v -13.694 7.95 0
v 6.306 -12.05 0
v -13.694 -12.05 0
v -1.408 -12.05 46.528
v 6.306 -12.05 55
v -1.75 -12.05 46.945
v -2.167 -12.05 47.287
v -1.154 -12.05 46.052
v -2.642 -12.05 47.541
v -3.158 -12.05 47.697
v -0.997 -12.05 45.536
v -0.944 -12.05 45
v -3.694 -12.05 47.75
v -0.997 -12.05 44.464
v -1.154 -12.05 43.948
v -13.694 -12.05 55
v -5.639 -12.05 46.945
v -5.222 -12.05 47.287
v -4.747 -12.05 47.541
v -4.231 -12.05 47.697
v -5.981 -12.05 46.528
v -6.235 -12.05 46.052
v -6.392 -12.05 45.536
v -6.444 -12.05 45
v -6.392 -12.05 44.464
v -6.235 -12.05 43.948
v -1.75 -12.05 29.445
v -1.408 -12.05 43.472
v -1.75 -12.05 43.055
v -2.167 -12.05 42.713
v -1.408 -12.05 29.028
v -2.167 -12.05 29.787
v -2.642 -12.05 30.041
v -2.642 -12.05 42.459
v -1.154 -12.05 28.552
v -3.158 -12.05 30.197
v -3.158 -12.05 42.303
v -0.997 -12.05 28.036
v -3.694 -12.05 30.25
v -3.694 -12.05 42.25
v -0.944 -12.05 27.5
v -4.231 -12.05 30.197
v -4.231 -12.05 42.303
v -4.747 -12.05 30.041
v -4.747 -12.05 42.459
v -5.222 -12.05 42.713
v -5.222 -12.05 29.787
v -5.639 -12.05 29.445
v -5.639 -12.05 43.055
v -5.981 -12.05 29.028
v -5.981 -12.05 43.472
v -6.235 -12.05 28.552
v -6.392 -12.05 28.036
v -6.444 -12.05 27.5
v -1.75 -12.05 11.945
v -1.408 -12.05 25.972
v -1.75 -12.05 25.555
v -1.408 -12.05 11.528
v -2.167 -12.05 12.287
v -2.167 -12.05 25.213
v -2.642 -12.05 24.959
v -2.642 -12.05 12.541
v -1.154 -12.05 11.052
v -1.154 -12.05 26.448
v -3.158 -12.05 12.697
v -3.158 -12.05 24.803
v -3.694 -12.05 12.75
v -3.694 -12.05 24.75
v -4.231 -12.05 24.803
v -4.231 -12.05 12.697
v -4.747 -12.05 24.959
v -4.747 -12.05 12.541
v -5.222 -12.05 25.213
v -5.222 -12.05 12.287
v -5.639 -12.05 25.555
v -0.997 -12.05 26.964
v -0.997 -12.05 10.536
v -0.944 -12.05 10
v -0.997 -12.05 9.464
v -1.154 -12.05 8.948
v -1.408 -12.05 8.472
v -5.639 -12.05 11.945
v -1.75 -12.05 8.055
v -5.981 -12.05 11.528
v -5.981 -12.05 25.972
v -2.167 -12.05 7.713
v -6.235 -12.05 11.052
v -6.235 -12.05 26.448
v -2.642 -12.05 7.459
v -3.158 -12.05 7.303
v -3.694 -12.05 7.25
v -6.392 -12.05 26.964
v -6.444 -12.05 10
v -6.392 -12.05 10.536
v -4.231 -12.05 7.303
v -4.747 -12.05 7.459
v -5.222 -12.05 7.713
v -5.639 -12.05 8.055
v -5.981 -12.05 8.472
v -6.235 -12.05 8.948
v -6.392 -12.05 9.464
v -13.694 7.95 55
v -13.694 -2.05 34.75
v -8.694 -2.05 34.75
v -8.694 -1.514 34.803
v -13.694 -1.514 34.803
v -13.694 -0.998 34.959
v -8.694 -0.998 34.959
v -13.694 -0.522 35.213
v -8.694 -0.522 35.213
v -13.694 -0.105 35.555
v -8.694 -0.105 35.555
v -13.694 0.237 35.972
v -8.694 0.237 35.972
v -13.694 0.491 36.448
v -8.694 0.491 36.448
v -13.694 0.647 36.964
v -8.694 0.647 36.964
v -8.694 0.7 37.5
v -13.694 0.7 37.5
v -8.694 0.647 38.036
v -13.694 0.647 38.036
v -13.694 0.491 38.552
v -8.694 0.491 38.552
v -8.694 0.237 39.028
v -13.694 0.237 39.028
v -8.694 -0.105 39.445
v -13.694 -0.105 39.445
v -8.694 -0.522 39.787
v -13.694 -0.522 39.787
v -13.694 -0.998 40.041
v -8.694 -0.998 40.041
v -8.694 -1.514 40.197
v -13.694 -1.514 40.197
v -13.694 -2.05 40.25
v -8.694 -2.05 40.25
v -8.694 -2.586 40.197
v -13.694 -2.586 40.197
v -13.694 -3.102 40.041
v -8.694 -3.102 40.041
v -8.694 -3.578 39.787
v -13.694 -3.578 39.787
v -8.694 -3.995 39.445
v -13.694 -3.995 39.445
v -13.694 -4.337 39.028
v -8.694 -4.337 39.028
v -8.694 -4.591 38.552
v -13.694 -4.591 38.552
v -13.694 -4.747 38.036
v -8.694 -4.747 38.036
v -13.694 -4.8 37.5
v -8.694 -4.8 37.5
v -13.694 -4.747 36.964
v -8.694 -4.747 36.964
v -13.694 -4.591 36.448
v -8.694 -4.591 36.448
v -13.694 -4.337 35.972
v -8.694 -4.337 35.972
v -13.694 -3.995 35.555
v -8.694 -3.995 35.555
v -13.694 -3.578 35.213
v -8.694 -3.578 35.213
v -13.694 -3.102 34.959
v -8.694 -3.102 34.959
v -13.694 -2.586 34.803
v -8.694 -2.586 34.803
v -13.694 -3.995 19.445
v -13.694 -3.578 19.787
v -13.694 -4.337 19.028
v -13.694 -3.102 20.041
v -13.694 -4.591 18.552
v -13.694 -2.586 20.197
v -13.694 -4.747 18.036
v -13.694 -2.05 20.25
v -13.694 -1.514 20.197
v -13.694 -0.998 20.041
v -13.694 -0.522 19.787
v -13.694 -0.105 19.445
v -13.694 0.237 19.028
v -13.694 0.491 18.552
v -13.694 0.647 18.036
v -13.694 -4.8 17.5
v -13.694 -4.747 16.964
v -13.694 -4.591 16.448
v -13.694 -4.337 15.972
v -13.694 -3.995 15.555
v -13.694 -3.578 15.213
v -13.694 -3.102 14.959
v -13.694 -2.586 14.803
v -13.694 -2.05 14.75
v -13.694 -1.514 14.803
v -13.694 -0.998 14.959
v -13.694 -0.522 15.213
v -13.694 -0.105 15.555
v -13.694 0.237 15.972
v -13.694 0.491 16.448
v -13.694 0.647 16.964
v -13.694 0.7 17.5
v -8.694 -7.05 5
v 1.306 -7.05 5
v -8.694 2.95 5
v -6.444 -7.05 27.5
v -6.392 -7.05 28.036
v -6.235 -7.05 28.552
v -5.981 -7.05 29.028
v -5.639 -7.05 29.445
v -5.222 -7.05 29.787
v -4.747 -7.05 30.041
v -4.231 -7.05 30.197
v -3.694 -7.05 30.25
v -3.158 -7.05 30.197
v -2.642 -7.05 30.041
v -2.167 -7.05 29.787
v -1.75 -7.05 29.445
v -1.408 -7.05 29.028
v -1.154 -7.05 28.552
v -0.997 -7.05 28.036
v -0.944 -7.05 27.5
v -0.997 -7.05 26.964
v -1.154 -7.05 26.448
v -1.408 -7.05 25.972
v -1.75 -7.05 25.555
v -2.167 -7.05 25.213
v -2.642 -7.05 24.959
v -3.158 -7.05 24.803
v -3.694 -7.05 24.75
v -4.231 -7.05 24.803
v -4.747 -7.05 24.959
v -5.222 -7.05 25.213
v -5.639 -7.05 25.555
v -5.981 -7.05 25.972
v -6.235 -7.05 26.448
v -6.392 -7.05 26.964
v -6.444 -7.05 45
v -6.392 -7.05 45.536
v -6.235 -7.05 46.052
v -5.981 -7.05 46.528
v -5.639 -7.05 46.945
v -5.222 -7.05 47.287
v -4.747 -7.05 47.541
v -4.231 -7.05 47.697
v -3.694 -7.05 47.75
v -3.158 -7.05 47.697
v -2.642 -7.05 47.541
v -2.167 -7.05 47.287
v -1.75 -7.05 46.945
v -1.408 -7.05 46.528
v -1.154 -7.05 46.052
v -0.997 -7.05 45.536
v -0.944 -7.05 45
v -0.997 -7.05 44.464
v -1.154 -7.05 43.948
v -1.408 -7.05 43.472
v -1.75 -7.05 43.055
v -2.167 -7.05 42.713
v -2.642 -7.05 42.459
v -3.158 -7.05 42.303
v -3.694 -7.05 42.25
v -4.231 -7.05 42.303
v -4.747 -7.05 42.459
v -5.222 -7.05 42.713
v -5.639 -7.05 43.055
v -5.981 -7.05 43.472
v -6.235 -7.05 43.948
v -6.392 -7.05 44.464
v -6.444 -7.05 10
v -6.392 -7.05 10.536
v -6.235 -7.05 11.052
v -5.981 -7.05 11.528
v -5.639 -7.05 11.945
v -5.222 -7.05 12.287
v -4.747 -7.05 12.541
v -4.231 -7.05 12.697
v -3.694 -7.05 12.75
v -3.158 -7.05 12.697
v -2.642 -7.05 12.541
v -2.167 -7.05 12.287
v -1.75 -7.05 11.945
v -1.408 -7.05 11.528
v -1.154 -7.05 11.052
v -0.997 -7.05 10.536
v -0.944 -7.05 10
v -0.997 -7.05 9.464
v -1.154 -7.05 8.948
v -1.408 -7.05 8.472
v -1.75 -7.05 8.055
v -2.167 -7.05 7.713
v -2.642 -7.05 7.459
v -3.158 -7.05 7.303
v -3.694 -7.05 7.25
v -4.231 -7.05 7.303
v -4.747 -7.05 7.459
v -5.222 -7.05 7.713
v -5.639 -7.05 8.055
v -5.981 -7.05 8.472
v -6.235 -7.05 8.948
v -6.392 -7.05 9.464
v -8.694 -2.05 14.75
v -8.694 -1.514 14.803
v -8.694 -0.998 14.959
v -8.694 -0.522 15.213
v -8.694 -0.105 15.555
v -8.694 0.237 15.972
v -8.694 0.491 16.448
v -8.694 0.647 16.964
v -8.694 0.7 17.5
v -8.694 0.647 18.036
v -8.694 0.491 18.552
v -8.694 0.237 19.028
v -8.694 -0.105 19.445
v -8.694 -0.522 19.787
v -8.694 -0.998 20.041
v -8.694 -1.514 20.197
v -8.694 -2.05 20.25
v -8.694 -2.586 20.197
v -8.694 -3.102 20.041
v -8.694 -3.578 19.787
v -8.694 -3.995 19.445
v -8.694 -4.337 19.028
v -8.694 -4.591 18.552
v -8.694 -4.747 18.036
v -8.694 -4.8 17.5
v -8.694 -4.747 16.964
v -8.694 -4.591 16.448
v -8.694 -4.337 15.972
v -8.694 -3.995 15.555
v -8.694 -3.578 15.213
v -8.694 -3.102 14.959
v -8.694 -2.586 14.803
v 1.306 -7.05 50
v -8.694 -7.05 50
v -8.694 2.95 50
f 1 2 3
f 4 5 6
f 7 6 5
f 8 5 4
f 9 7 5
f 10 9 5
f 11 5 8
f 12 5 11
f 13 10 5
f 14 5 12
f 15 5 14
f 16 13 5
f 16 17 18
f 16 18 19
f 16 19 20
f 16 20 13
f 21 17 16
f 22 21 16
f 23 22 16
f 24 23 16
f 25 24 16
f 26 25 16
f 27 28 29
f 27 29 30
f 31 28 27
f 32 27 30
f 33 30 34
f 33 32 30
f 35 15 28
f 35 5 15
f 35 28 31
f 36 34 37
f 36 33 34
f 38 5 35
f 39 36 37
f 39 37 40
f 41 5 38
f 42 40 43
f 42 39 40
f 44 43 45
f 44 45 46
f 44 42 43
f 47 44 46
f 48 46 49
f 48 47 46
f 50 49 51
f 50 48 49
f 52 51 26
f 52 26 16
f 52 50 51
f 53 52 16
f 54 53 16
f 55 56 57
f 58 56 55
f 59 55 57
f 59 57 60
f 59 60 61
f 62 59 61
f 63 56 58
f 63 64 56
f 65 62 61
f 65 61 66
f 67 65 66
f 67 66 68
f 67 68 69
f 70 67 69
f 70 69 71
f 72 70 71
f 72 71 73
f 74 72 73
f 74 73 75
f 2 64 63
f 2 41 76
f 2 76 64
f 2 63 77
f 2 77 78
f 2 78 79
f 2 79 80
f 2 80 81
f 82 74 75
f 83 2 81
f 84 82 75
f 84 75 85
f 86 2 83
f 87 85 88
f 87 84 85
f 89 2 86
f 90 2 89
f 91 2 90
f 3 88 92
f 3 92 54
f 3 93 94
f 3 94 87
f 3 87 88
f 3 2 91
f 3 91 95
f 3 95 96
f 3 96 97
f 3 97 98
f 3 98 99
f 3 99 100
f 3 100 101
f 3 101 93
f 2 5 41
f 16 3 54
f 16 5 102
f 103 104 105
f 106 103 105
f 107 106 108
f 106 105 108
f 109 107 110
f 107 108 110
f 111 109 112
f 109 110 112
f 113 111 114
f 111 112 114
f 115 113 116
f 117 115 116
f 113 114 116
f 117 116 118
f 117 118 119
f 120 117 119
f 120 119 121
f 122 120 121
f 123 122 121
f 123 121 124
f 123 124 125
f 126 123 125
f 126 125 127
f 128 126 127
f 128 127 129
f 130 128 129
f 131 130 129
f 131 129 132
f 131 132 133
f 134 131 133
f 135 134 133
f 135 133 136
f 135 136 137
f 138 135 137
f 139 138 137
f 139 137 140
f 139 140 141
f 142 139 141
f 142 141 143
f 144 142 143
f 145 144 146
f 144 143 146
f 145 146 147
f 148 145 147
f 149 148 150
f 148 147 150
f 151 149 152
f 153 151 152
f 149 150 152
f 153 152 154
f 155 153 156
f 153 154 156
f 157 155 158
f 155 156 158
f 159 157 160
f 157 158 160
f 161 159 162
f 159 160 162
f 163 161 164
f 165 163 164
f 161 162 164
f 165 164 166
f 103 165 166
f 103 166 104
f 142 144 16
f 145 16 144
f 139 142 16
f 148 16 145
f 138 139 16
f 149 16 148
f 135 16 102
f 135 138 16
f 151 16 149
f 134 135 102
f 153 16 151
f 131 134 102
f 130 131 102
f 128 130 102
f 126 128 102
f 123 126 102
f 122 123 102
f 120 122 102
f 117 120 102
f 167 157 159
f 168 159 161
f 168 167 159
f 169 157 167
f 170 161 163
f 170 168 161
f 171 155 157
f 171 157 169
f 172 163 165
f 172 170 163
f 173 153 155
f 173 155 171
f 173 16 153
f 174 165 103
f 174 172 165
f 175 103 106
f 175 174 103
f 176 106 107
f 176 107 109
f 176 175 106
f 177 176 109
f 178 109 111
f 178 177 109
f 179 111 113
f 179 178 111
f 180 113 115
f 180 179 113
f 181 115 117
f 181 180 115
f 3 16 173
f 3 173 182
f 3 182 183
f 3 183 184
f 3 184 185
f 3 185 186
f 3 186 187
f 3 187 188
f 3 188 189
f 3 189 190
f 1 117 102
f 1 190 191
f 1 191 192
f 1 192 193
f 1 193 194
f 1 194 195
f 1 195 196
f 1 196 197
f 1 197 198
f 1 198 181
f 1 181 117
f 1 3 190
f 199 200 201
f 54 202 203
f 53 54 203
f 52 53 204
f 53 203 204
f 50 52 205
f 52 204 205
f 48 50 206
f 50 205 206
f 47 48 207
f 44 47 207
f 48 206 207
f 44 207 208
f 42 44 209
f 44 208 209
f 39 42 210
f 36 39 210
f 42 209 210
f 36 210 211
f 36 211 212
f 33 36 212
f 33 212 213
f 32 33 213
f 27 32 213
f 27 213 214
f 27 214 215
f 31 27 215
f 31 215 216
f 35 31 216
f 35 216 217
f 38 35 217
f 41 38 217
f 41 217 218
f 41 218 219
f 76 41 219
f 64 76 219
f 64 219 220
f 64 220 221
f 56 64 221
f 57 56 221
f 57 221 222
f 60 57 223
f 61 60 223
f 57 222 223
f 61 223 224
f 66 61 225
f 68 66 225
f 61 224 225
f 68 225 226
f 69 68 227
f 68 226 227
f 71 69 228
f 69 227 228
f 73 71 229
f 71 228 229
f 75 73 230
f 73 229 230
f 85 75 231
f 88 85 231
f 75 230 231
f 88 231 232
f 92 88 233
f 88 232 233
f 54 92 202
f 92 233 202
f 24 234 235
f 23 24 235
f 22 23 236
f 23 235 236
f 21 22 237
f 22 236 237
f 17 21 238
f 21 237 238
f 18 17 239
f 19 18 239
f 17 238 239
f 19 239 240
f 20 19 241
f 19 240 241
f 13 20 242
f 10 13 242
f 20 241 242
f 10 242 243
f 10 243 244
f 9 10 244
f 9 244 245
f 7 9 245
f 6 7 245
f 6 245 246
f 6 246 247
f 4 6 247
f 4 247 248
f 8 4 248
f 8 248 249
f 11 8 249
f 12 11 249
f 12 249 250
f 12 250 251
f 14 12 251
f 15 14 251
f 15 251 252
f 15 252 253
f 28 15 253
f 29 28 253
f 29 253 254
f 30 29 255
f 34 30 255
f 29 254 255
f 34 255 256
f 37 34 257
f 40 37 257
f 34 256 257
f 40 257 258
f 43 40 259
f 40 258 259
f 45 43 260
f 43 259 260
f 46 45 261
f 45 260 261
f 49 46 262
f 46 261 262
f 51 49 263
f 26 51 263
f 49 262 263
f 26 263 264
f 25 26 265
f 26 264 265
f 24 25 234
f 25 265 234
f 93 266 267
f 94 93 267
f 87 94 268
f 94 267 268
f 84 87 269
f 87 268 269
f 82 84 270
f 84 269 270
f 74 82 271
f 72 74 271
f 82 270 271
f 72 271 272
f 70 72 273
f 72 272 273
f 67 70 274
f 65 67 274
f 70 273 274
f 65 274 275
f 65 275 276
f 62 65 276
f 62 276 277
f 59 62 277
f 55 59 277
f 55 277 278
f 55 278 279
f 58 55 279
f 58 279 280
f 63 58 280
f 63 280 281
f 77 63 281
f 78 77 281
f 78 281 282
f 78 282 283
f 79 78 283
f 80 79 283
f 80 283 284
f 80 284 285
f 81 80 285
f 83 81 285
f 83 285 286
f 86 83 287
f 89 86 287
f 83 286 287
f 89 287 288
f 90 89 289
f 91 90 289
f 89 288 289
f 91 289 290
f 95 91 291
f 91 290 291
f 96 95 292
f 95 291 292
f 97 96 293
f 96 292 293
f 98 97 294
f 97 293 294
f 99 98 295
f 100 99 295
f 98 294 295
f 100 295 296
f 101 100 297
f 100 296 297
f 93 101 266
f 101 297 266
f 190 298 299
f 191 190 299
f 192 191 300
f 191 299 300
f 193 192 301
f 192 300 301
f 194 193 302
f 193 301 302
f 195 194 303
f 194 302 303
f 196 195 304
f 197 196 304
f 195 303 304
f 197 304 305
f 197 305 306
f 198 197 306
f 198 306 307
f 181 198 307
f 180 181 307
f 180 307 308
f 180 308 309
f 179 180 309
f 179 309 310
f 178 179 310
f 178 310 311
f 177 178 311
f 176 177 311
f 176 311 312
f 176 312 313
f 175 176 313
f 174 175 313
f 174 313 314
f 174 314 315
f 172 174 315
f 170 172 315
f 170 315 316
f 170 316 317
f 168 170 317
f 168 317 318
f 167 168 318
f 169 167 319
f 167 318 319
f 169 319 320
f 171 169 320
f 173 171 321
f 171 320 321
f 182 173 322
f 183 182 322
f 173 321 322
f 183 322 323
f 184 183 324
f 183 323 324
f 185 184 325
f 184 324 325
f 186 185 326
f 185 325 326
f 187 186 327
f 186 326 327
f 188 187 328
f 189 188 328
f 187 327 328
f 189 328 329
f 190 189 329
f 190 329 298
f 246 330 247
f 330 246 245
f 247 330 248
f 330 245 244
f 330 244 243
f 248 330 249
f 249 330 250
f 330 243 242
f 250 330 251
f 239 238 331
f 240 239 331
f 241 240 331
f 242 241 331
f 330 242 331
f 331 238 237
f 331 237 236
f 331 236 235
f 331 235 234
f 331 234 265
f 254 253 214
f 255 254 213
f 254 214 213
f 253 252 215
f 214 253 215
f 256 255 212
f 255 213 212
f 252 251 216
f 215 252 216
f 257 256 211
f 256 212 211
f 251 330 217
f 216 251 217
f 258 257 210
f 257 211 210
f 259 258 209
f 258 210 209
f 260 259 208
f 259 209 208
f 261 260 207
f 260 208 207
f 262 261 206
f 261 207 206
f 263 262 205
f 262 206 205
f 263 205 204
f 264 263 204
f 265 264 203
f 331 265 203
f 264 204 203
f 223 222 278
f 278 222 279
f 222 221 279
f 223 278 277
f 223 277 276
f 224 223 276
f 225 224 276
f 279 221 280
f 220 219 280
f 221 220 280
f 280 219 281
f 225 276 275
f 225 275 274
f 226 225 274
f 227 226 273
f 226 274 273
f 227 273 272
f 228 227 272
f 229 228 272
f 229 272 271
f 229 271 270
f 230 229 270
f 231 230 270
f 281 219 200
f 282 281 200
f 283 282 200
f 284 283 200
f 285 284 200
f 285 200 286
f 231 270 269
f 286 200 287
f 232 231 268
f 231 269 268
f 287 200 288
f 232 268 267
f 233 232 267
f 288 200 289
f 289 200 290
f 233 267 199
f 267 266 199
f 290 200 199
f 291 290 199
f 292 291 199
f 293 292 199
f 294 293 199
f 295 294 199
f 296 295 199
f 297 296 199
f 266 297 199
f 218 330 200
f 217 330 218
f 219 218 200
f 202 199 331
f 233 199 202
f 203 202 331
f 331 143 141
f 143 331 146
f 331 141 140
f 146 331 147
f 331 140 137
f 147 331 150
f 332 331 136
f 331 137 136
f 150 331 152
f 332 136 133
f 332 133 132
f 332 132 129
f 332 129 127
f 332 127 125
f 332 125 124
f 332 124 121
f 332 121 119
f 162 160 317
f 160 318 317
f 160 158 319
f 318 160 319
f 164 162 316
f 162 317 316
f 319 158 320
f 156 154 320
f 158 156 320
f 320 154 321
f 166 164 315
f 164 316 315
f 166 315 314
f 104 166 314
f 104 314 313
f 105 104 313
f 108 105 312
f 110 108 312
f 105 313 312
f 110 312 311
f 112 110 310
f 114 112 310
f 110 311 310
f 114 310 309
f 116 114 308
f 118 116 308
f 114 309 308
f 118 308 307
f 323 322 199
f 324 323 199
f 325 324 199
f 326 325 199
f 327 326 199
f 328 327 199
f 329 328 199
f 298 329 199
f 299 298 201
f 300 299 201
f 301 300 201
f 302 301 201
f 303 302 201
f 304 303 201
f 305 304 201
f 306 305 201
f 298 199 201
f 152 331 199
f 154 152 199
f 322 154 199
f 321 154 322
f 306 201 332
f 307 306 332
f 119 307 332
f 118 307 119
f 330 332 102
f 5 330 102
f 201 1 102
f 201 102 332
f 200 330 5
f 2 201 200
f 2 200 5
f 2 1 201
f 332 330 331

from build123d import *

# Parameters (mm, degrees)
BOSS_EXTRU_1_DEPTH      = 5
BOSS_EXTRU_2_DEPTH      = 45
BOSS_EXTRU_3_DEPTH      = 5
ENL_V_MAT_EXTRU_1_REACH = 60.268
ESQUISSE4_R             = 2.75
ENL_V_MAT_EXTRU_2_REACH = 60.631
ESQUISSE5_R             = 2.75


with BuildPart() as part:
    # Esquisse1 → Boss.-Extru.1 (new body)
    with BuildSketch(Plane.XY):
        Polygon((-13.694471154, 7.95), (6.305528846, -12.05), (-13.694471154, -12.05), align=None)
    extrude(amount=BOSS_EXTRU_1_DEPTH)

    # Esquisse2 → Boss.-Extru.2 (add)
    with BuildSketch(Plane.XY.offset(5)):
        Polygon((-13.694471154, -12.05), (6.305528846, -12.05), (1.305528846, -7.05), (-8.694471154, -7.05), (-8.694471154, 2.95), (-13.694471154, 7.95), align=None)
    extrude(amount=BOSS_EXTRU_2_DEPTH)

    # Esquisse3 → Boss.-Extru.3 (add)
    with BuildSketch(Plane.XY.offset(50)):
        Polygon((-13.694471154, 7.95), (6.305528846, -12.05), (-13.694471154, -12.05), align=None)
    extrude(amount=BOSS_EXTRU_3_DEPTH)

    # Esquisse4 → Enlèv. mat.-Extru.1 (cut, up to next)
    with BuildSketch(Plane(origin=(-8.694471154, 0, 0), x_dir=(0, 0, -1), z_dir=(1, 0, 0)), mode=Mode.PRIVATE) as enl_v_mat_extru_1_sk1:
        with Locations((-17.5, -2.05)):
            Circle(ESQUISSE4_R)
    enl_v_mat_extru_1_tool1 = extrude(enl_v_mat_extru_1_sk1.sketch, amount=-ENL_V_MAT_EXTRU_1_REACH, mode=Mode.PRIVATE) & part.part
    # Esquisse4 → Enlèv. mat.-Extru.1 (cut, up to next)
    with BuildSketch(Plane(origin=(-8.694471154, 0, 0), x_dir=(0, 0, -1), z_dir=(1, 0, 0)), mode=Mode.PRIVATE) as enl_v_mat_extru_1_sk2:
        with Locations((-37.5, -2.05)):
            Circle(ESQUISSE4_R)
    enl_v_mat_extru_1_tool2 = extrude(enl_v_mat_extru_1_sk2.sketch, amount=-ENL_V_MAT_EXTRU_1_REACH, mode=Mode.PRIVATE) & part.part
    add(enl_v_mat_extru_1_tool1.solids().sort_by_distance((-8.694471, -2.05, 17.5))[0], mode=Mode.SUBTRACT)
    add(enl_v_mat_extru_1_tool2.solids().sort_by_distance((-8.694471, -2.05, 37.5))[0], mode=Mode.SUBTRACT)

    # Esquisse5 → Enlèv. mat.-Extru.2 (cut, up to next)
    with BuildSketch(Plane(origin=(0, -7.05, 0), x_dir=(1, 0, 0), z_dir=(0, 1, 0)), mode=Mode.PRIVATE) as enl_v_mat_extru_2_sk1:
        with Locations(Location((-3.694471154, -45, 0), (0, 0, 180))):
            Circle(ESQUISSE5_R)
    enl_v_mat_extru_2_tool1 = extrude(enl_v_mat_extru_2_sk1.sketch, amount=-ENL_V_MAT_EXTRU_2_REACH, mode=Mode.PRIVATE) & part.part
    # Esquisse5 → Enlèv. mat.-Extru.2 (cut, up to next)
    with BuildSketch(Plane(origin=(0, -7.05, 0), x_dir=(1, 0, 0), z_dir=(0, 1, 0)), mode=Mode.PRIVATE) as enl_v_mat_extru_2_sk2:
        with Locations(Location((-3.694471154, -27.5, 0), (0, 0, 180))):
            Circle(ESQUISSE5_R)
    enl_v_mat_extru_2_tool2 = extrude(enl_v_mat_extru_2_sk2.sketch, amount=-ENL_V_MAT_EXTRU_2_REACH, mode=Mode.PRIVATE) & part.part
    # Esquisse5 → Enlèv. mat.-Extru.2 (cut, up to next)
    with BuildSketch(Plane(origin=(0, -7.05, 0), x_dir=(1, 0, 0), z_dir=(0, 1, 0)), mode=Mode.PRIVATE) as enl_v_mat_extru_2_sk3:
        with Locations(Location((-3.694471154, -10, 0), (0, 0, 180))):
            Circle(ESQUISSE5_R)
    enl_v_mat_extru_2_tool3 = extrude(enl_v_mat_extru_2_sk3.sketch, amount=-ENL_V_MAT_EXTRU_2_REACH, mode=Mode.PRIVATE) & part.part
    add(enl_v_mat_extru_2_tool1.solids().sort_by_distance((-3.694471, -7.05, 45))[0], mode=Mode.SUBTRACT)
    add(enl_v_mat_extru_2_tool2.solids().sort_by_distance((-3.694471, -7.05, 27.5))[0], mode=Mode.SUBTRACT)
    add(enl_v_mat_extru_2_tool3.solids().sort_by_distance((-3.694471, -7.05, 10))[0], mode=Mode.SUBTRACT)


solid = part.part
